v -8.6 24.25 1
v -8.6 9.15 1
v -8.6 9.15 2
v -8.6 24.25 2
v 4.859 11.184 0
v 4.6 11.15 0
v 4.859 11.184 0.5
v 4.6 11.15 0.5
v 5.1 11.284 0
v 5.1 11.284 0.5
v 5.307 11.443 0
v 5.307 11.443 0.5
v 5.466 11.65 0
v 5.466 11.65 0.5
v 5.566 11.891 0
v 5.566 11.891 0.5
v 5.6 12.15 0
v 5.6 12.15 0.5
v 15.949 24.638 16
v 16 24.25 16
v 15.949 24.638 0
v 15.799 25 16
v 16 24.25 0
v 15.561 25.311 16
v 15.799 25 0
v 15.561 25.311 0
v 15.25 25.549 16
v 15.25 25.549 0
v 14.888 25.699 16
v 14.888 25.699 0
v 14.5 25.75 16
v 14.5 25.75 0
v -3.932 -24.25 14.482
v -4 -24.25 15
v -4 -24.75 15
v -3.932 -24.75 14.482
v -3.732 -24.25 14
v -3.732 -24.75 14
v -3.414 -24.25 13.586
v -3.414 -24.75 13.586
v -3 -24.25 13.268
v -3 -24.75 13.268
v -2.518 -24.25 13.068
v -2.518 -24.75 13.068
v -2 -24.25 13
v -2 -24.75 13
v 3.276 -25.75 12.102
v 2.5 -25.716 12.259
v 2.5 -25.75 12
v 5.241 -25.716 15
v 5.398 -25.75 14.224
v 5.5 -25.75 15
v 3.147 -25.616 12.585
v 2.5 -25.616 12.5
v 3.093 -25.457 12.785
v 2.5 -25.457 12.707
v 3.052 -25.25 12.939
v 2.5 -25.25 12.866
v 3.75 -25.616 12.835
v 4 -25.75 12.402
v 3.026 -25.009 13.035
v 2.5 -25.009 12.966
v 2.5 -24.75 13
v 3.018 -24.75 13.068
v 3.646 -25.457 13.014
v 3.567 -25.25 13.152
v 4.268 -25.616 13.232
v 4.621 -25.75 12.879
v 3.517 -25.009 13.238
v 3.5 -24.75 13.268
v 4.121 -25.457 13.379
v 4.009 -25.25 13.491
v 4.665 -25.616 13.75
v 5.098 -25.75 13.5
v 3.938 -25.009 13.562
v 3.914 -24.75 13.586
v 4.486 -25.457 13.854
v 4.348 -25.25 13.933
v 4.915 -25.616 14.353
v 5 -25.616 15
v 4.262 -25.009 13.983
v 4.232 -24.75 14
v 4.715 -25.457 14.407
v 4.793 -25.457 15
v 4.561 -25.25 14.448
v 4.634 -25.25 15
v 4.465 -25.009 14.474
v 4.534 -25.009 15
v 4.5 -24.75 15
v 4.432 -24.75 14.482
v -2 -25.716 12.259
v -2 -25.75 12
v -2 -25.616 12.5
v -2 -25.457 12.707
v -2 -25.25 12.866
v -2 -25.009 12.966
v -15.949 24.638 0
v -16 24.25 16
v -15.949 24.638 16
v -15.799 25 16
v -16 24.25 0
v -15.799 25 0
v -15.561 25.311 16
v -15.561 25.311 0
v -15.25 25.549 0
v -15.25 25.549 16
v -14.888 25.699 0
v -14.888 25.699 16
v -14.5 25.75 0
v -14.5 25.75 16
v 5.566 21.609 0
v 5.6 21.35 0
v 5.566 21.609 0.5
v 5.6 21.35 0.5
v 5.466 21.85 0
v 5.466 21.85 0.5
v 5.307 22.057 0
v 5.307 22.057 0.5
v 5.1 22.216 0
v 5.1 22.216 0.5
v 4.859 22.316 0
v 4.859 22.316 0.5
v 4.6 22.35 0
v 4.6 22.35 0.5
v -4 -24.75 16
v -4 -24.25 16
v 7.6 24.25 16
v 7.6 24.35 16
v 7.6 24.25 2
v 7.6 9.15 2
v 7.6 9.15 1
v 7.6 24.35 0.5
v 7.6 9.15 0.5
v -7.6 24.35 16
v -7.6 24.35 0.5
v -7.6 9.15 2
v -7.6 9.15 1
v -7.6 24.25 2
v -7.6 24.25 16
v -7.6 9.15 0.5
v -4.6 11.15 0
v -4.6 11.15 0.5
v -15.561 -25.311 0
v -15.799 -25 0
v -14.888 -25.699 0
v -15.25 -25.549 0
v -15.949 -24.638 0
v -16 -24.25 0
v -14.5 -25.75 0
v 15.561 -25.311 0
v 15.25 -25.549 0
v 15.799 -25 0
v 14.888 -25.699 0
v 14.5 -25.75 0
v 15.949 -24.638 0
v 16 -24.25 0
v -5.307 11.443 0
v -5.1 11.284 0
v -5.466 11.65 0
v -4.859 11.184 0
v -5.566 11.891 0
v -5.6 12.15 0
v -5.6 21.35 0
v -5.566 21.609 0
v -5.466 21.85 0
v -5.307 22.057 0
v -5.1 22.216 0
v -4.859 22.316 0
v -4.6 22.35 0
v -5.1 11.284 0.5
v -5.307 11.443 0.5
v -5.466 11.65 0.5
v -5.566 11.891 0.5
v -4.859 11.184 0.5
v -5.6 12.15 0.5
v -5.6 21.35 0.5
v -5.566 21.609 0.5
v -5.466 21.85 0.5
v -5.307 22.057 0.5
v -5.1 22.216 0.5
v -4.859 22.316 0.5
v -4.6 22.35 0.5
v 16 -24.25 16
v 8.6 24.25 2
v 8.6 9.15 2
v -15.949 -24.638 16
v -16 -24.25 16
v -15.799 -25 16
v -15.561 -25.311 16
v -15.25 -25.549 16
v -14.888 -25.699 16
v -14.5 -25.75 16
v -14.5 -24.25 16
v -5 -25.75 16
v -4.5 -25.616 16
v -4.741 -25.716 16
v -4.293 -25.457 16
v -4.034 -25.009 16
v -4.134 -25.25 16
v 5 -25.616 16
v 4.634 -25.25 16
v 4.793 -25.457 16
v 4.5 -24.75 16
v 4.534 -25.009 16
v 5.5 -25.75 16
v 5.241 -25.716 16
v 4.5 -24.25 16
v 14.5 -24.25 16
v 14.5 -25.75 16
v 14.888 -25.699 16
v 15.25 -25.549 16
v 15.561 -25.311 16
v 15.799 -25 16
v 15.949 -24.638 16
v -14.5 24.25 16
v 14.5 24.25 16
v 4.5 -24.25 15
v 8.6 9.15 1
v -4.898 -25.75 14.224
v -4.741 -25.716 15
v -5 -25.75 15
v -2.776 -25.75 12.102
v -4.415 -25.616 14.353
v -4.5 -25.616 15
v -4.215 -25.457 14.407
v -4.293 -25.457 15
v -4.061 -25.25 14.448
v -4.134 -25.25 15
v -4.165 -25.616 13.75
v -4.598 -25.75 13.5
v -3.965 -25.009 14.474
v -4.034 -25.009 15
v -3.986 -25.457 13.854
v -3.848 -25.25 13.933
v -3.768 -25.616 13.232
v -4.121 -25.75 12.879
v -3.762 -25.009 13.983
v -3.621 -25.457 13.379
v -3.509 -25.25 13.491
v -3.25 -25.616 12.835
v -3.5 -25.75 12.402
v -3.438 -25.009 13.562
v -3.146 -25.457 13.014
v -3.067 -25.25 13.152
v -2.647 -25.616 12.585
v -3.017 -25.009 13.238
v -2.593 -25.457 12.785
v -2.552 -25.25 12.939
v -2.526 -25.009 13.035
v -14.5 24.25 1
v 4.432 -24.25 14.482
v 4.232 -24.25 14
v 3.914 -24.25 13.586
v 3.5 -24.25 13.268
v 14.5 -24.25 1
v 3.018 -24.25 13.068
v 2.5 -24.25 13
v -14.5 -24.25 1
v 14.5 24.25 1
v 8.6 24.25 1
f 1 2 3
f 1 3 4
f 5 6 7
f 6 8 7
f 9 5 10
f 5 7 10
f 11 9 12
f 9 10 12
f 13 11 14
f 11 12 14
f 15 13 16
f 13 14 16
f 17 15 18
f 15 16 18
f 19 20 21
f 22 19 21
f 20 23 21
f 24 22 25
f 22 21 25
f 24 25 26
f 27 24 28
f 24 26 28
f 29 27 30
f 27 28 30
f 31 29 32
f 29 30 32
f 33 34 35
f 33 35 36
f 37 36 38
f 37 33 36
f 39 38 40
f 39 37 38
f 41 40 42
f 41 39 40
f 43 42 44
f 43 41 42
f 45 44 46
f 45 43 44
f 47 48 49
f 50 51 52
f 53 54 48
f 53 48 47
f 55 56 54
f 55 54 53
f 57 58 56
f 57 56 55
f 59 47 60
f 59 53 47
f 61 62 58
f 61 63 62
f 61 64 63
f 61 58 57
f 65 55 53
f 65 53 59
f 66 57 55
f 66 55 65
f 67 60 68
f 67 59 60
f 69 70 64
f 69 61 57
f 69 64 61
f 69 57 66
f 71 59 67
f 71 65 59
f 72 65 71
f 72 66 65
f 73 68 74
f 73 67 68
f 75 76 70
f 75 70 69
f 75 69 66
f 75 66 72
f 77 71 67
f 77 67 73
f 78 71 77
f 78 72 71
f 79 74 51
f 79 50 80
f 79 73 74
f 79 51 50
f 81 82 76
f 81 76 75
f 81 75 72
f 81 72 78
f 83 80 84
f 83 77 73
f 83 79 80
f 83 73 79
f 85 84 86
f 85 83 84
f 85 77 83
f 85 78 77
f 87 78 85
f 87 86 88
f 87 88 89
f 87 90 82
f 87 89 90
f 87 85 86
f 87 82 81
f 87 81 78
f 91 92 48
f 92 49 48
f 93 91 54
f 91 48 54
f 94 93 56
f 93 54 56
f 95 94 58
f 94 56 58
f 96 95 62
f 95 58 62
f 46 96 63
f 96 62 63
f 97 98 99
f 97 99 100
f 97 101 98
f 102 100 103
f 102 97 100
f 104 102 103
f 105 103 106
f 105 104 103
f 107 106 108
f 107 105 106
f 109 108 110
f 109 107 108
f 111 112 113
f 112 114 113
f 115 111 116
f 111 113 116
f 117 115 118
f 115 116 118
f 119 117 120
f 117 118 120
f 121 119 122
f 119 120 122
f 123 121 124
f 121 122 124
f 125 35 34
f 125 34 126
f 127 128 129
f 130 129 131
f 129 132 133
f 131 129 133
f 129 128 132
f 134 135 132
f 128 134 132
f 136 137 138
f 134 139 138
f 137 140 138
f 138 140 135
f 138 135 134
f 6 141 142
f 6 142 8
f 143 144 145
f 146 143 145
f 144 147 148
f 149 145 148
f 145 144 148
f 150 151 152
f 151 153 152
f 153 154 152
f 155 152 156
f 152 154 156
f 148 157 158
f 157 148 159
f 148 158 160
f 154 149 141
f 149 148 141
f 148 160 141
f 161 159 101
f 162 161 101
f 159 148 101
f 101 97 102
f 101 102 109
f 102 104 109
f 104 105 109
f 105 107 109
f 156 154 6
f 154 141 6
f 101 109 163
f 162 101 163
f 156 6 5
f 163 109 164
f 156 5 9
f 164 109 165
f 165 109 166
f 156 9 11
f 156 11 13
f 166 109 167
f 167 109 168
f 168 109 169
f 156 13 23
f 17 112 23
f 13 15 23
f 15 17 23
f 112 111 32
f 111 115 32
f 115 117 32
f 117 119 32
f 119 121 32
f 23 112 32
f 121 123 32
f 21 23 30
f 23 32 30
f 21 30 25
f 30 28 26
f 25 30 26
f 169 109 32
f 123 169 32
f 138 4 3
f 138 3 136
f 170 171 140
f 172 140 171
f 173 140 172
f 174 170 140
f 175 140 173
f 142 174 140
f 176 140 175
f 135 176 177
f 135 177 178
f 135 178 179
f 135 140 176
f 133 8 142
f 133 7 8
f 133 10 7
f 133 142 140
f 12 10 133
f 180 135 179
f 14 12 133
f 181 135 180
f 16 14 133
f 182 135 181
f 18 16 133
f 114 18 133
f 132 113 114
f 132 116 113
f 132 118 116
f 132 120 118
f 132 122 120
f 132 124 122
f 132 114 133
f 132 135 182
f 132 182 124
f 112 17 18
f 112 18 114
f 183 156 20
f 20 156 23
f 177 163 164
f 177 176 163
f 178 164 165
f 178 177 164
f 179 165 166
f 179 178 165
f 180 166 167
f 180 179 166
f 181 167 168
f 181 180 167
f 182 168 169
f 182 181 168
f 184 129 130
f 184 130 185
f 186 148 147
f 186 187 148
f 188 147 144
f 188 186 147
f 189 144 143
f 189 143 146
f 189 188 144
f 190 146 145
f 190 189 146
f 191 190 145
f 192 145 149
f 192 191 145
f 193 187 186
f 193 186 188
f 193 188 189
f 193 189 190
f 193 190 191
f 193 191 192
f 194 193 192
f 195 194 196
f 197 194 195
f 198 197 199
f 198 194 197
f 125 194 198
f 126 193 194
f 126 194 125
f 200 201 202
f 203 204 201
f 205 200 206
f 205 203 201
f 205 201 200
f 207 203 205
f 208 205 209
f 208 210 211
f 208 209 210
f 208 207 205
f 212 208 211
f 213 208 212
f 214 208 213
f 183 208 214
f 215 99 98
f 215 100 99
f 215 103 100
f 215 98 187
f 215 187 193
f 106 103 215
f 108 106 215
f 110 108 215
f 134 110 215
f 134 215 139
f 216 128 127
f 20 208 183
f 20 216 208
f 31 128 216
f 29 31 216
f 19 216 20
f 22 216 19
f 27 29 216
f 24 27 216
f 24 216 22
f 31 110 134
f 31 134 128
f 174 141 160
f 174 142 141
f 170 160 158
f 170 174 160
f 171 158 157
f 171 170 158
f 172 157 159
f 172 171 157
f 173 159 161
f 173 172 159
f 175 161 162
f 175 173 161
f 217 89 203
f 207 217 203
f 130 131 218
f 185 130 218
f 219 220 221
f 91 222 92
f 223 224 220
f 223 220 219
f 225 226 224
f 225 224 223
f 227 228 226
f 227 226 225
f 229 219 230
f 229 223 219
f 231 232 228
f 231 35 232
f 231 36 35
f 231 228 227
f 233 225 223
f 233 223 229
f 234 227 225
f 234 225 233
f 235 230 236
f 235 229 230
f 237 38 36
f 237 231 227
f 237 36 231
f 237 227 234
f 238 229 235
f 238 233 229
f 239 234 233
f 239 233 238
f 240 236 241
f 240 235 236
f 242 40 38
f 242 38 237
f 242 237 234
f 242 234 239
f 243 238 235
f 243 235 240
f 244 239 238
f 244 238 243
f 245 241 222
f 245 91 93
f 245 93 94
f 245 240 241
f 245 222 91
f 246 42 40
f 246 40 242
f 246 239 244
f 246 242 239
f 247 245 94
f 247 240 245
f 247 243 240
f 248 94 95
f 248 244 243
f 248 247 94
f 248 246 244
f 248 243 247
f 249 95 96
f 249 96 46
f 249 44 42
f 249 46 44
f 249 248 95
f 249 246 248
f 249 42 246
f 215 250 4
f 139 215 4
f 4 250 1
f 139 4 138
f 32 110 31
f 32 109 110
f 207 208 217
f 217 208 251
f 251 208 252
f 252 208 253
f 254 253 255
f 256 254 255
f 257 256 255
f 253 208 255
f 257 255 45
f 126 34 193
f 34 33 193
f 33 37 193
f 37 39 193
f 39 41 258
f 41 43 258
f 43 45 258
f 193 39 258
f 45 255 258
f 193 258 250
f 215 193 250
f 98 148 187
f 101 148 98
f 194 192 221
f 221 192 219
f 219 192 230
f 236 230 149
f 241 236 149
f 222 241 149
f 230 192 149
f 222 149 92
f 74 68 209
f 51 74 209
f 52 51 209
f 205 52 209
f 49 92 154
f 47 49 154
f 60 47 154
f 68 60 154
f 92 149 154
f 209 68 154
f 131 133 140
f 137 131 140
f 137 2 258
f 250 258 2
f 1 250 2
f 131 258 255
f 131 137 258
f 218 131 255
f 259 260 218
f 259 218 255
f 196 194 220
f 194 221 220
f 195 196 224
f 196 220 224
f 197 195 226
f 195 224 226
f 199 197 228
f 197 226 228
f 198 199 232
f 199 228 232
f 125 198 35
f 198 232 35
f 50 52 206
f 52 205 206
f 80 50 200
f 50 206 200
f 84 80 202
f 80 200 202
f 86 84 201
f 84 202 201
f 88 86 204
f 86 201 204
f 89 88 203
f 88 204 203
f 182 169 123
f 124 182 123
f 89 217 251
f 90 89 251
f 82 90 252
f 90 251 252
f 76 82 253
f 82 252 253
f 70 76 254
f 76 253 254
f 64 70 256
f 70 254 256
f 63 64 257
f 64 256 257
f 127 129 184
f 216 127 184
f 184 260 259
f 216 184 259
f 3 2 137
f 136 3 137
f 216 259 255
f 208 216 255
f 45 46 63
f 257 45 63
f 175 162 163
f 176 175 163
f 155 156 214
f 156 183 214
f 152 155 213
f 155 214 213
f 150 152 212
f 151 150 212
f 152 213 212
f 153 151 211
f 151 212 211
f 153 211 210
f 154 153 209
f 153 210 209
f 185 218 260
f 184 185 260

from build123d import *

# Parameters (mm, degrees)
F0_W      = 32
F0_H      = 51.5
F1_DEPTH  = 1
F2_DEPTH  = 16
F3_R      = 1.5
F4_W      = 8.5
F4_H      = 3
F5_DEPTH  = 5
F6_R      = 2
F7_R      = 1
F0_W_2    = 15.2
F0_H_2    = 13.6
F0_W_3    = 11.1999999404
F0_H_3    = 11.1999999404
F0_H_4    = 0.1
F0_H_5    = 1.5
F8_DEPTH  = 0.5
F9_R      = 1
F10_W     = 1
F10_H     = 15.1
F11_DEPTH = 1


with BuildPart() as f1:
    # F0 (on Top) → F1 (new body)
    with BuildSketch(Plane.XY):
        Rectangle(F0_W, F0_H)
        Polygon((7.6, 24.35), (7.6, 24.25), (14.5, 24.25), (14.5, -24.25), (-14.5, -24.25), (-14.5, 24.25), (-7.6, 24.25), (-7.6, 24.35), align=None, mode=Mode.SUBTRACT)
        Polygon((13, 22.75), (13, -22.75), (-13, -22.75), (-13, 22.75), (-7.6, 22.75), (-7.6, 24.25), (-14.5, 24.25), (-14.5, -24.25), (14.5, -24.25), (14.5, 24.25), (7.6, 24.25), (7.6, 22.75), align=None)
        Polygon((-13, -22.75), (13, -22.75), (13, 22.75), (7.6, 22.75), (7.6, 9.15), (-7.6, 9.15), (-7.6, 22.75), (-13, 22.75), align=None)
    extrude(amount=F1_DEPTH)

    # F0 (on Top) → F2 (join)
    with BuildSketch(Plane.XY):
        Rectangle(F0_W, F0_H)
        Polygon((7.6, 24.35), (7.6, 24.25), (14.5, 24.25), (14.5, -24.25), (-14.5, -24.25), (-14.5, 24.25), (-7.6, 24.25), (-7.6, 24.35), align=None, mode=Mode.SUBTRACT)
    extrude(amount=F2_DEPTH)

    # F3
    f3_edges = [f1.edges().sort_by_distance(p)[0] for p in [
        (-16, -25.75, 8),
        (16, -25.75, 8),
        (-16, 25.75, 8),
        (16, 25.75, 8),
    ]]
    fillet(f3_edges, radius=F3_R)

    # F4 (on face) → F5 (cut)
    with BuildSketch(Plane.XZ.offset(25.75)):
        with Locations((0.25, 14.5)):
            Rectangle(F4_W, F4_H)
    extrude(amount=-F5_DEPTH, mode=Mode.SUBTRACT)

    # F6
    f6_edges = [f1.edges().sort_by_distance(p)[0] for p in [
        (-4, -25, 13),
        (4.5, -25, 13),
    ]]
    fillet(f6_edges, radius=F6_R)

    # F7
    f7_edges = [f1.edges().sort_by_distance(p)[0] for p in [
        (-3.414214, -25.75, 13.585786),
        (0.25, -25.75, 13),
    ]]
    fillet(f7_edges, radius=F7_R)

    # F0 (on Top) → F8 (join)
    with BuildSketch(Plane.XY):
        with Locations((0, 15.95)):
            Rectangle(F0_W_2, F0_H_2)
        with Locations((0, 16.75)):
            Rectangle(F0_W_3, F0_H_3, mode=Mode.SUBTRACT)
        with Locations((0, 24.3)):
            Rectangle(F0_W_2, F0_H_4)
        with Locations((0, 23.5)):
            Rectangle(F0_W_2, F0_H_5)
    extrude(amount=F8_DEPTH)

    # F9
    f9_edges = [f1.edges().sort_by_distance(p)[0] for p in [
        (5.6, 11.15, 0.25),
        (-5.6, 11.15, 0.25),
        (5.6, 22.35, 0.25),
        (-5.6, 22.35, 0.25),
    ]]
    fillet(f9_edges, radius=F9_R)

    # F10 (on face) → F11 (join)
    with BuildSketch(Plane.XY.offset(1)):
        with Locations((-8.1, 16.7)):
            Rectangle(F10_W, F10_H)
        with Locations((8.1, 16.7)):
            Rectangle(F10_W, F10_H)
    extrude(amount=F11_DEPTH)


solid = f1.part
